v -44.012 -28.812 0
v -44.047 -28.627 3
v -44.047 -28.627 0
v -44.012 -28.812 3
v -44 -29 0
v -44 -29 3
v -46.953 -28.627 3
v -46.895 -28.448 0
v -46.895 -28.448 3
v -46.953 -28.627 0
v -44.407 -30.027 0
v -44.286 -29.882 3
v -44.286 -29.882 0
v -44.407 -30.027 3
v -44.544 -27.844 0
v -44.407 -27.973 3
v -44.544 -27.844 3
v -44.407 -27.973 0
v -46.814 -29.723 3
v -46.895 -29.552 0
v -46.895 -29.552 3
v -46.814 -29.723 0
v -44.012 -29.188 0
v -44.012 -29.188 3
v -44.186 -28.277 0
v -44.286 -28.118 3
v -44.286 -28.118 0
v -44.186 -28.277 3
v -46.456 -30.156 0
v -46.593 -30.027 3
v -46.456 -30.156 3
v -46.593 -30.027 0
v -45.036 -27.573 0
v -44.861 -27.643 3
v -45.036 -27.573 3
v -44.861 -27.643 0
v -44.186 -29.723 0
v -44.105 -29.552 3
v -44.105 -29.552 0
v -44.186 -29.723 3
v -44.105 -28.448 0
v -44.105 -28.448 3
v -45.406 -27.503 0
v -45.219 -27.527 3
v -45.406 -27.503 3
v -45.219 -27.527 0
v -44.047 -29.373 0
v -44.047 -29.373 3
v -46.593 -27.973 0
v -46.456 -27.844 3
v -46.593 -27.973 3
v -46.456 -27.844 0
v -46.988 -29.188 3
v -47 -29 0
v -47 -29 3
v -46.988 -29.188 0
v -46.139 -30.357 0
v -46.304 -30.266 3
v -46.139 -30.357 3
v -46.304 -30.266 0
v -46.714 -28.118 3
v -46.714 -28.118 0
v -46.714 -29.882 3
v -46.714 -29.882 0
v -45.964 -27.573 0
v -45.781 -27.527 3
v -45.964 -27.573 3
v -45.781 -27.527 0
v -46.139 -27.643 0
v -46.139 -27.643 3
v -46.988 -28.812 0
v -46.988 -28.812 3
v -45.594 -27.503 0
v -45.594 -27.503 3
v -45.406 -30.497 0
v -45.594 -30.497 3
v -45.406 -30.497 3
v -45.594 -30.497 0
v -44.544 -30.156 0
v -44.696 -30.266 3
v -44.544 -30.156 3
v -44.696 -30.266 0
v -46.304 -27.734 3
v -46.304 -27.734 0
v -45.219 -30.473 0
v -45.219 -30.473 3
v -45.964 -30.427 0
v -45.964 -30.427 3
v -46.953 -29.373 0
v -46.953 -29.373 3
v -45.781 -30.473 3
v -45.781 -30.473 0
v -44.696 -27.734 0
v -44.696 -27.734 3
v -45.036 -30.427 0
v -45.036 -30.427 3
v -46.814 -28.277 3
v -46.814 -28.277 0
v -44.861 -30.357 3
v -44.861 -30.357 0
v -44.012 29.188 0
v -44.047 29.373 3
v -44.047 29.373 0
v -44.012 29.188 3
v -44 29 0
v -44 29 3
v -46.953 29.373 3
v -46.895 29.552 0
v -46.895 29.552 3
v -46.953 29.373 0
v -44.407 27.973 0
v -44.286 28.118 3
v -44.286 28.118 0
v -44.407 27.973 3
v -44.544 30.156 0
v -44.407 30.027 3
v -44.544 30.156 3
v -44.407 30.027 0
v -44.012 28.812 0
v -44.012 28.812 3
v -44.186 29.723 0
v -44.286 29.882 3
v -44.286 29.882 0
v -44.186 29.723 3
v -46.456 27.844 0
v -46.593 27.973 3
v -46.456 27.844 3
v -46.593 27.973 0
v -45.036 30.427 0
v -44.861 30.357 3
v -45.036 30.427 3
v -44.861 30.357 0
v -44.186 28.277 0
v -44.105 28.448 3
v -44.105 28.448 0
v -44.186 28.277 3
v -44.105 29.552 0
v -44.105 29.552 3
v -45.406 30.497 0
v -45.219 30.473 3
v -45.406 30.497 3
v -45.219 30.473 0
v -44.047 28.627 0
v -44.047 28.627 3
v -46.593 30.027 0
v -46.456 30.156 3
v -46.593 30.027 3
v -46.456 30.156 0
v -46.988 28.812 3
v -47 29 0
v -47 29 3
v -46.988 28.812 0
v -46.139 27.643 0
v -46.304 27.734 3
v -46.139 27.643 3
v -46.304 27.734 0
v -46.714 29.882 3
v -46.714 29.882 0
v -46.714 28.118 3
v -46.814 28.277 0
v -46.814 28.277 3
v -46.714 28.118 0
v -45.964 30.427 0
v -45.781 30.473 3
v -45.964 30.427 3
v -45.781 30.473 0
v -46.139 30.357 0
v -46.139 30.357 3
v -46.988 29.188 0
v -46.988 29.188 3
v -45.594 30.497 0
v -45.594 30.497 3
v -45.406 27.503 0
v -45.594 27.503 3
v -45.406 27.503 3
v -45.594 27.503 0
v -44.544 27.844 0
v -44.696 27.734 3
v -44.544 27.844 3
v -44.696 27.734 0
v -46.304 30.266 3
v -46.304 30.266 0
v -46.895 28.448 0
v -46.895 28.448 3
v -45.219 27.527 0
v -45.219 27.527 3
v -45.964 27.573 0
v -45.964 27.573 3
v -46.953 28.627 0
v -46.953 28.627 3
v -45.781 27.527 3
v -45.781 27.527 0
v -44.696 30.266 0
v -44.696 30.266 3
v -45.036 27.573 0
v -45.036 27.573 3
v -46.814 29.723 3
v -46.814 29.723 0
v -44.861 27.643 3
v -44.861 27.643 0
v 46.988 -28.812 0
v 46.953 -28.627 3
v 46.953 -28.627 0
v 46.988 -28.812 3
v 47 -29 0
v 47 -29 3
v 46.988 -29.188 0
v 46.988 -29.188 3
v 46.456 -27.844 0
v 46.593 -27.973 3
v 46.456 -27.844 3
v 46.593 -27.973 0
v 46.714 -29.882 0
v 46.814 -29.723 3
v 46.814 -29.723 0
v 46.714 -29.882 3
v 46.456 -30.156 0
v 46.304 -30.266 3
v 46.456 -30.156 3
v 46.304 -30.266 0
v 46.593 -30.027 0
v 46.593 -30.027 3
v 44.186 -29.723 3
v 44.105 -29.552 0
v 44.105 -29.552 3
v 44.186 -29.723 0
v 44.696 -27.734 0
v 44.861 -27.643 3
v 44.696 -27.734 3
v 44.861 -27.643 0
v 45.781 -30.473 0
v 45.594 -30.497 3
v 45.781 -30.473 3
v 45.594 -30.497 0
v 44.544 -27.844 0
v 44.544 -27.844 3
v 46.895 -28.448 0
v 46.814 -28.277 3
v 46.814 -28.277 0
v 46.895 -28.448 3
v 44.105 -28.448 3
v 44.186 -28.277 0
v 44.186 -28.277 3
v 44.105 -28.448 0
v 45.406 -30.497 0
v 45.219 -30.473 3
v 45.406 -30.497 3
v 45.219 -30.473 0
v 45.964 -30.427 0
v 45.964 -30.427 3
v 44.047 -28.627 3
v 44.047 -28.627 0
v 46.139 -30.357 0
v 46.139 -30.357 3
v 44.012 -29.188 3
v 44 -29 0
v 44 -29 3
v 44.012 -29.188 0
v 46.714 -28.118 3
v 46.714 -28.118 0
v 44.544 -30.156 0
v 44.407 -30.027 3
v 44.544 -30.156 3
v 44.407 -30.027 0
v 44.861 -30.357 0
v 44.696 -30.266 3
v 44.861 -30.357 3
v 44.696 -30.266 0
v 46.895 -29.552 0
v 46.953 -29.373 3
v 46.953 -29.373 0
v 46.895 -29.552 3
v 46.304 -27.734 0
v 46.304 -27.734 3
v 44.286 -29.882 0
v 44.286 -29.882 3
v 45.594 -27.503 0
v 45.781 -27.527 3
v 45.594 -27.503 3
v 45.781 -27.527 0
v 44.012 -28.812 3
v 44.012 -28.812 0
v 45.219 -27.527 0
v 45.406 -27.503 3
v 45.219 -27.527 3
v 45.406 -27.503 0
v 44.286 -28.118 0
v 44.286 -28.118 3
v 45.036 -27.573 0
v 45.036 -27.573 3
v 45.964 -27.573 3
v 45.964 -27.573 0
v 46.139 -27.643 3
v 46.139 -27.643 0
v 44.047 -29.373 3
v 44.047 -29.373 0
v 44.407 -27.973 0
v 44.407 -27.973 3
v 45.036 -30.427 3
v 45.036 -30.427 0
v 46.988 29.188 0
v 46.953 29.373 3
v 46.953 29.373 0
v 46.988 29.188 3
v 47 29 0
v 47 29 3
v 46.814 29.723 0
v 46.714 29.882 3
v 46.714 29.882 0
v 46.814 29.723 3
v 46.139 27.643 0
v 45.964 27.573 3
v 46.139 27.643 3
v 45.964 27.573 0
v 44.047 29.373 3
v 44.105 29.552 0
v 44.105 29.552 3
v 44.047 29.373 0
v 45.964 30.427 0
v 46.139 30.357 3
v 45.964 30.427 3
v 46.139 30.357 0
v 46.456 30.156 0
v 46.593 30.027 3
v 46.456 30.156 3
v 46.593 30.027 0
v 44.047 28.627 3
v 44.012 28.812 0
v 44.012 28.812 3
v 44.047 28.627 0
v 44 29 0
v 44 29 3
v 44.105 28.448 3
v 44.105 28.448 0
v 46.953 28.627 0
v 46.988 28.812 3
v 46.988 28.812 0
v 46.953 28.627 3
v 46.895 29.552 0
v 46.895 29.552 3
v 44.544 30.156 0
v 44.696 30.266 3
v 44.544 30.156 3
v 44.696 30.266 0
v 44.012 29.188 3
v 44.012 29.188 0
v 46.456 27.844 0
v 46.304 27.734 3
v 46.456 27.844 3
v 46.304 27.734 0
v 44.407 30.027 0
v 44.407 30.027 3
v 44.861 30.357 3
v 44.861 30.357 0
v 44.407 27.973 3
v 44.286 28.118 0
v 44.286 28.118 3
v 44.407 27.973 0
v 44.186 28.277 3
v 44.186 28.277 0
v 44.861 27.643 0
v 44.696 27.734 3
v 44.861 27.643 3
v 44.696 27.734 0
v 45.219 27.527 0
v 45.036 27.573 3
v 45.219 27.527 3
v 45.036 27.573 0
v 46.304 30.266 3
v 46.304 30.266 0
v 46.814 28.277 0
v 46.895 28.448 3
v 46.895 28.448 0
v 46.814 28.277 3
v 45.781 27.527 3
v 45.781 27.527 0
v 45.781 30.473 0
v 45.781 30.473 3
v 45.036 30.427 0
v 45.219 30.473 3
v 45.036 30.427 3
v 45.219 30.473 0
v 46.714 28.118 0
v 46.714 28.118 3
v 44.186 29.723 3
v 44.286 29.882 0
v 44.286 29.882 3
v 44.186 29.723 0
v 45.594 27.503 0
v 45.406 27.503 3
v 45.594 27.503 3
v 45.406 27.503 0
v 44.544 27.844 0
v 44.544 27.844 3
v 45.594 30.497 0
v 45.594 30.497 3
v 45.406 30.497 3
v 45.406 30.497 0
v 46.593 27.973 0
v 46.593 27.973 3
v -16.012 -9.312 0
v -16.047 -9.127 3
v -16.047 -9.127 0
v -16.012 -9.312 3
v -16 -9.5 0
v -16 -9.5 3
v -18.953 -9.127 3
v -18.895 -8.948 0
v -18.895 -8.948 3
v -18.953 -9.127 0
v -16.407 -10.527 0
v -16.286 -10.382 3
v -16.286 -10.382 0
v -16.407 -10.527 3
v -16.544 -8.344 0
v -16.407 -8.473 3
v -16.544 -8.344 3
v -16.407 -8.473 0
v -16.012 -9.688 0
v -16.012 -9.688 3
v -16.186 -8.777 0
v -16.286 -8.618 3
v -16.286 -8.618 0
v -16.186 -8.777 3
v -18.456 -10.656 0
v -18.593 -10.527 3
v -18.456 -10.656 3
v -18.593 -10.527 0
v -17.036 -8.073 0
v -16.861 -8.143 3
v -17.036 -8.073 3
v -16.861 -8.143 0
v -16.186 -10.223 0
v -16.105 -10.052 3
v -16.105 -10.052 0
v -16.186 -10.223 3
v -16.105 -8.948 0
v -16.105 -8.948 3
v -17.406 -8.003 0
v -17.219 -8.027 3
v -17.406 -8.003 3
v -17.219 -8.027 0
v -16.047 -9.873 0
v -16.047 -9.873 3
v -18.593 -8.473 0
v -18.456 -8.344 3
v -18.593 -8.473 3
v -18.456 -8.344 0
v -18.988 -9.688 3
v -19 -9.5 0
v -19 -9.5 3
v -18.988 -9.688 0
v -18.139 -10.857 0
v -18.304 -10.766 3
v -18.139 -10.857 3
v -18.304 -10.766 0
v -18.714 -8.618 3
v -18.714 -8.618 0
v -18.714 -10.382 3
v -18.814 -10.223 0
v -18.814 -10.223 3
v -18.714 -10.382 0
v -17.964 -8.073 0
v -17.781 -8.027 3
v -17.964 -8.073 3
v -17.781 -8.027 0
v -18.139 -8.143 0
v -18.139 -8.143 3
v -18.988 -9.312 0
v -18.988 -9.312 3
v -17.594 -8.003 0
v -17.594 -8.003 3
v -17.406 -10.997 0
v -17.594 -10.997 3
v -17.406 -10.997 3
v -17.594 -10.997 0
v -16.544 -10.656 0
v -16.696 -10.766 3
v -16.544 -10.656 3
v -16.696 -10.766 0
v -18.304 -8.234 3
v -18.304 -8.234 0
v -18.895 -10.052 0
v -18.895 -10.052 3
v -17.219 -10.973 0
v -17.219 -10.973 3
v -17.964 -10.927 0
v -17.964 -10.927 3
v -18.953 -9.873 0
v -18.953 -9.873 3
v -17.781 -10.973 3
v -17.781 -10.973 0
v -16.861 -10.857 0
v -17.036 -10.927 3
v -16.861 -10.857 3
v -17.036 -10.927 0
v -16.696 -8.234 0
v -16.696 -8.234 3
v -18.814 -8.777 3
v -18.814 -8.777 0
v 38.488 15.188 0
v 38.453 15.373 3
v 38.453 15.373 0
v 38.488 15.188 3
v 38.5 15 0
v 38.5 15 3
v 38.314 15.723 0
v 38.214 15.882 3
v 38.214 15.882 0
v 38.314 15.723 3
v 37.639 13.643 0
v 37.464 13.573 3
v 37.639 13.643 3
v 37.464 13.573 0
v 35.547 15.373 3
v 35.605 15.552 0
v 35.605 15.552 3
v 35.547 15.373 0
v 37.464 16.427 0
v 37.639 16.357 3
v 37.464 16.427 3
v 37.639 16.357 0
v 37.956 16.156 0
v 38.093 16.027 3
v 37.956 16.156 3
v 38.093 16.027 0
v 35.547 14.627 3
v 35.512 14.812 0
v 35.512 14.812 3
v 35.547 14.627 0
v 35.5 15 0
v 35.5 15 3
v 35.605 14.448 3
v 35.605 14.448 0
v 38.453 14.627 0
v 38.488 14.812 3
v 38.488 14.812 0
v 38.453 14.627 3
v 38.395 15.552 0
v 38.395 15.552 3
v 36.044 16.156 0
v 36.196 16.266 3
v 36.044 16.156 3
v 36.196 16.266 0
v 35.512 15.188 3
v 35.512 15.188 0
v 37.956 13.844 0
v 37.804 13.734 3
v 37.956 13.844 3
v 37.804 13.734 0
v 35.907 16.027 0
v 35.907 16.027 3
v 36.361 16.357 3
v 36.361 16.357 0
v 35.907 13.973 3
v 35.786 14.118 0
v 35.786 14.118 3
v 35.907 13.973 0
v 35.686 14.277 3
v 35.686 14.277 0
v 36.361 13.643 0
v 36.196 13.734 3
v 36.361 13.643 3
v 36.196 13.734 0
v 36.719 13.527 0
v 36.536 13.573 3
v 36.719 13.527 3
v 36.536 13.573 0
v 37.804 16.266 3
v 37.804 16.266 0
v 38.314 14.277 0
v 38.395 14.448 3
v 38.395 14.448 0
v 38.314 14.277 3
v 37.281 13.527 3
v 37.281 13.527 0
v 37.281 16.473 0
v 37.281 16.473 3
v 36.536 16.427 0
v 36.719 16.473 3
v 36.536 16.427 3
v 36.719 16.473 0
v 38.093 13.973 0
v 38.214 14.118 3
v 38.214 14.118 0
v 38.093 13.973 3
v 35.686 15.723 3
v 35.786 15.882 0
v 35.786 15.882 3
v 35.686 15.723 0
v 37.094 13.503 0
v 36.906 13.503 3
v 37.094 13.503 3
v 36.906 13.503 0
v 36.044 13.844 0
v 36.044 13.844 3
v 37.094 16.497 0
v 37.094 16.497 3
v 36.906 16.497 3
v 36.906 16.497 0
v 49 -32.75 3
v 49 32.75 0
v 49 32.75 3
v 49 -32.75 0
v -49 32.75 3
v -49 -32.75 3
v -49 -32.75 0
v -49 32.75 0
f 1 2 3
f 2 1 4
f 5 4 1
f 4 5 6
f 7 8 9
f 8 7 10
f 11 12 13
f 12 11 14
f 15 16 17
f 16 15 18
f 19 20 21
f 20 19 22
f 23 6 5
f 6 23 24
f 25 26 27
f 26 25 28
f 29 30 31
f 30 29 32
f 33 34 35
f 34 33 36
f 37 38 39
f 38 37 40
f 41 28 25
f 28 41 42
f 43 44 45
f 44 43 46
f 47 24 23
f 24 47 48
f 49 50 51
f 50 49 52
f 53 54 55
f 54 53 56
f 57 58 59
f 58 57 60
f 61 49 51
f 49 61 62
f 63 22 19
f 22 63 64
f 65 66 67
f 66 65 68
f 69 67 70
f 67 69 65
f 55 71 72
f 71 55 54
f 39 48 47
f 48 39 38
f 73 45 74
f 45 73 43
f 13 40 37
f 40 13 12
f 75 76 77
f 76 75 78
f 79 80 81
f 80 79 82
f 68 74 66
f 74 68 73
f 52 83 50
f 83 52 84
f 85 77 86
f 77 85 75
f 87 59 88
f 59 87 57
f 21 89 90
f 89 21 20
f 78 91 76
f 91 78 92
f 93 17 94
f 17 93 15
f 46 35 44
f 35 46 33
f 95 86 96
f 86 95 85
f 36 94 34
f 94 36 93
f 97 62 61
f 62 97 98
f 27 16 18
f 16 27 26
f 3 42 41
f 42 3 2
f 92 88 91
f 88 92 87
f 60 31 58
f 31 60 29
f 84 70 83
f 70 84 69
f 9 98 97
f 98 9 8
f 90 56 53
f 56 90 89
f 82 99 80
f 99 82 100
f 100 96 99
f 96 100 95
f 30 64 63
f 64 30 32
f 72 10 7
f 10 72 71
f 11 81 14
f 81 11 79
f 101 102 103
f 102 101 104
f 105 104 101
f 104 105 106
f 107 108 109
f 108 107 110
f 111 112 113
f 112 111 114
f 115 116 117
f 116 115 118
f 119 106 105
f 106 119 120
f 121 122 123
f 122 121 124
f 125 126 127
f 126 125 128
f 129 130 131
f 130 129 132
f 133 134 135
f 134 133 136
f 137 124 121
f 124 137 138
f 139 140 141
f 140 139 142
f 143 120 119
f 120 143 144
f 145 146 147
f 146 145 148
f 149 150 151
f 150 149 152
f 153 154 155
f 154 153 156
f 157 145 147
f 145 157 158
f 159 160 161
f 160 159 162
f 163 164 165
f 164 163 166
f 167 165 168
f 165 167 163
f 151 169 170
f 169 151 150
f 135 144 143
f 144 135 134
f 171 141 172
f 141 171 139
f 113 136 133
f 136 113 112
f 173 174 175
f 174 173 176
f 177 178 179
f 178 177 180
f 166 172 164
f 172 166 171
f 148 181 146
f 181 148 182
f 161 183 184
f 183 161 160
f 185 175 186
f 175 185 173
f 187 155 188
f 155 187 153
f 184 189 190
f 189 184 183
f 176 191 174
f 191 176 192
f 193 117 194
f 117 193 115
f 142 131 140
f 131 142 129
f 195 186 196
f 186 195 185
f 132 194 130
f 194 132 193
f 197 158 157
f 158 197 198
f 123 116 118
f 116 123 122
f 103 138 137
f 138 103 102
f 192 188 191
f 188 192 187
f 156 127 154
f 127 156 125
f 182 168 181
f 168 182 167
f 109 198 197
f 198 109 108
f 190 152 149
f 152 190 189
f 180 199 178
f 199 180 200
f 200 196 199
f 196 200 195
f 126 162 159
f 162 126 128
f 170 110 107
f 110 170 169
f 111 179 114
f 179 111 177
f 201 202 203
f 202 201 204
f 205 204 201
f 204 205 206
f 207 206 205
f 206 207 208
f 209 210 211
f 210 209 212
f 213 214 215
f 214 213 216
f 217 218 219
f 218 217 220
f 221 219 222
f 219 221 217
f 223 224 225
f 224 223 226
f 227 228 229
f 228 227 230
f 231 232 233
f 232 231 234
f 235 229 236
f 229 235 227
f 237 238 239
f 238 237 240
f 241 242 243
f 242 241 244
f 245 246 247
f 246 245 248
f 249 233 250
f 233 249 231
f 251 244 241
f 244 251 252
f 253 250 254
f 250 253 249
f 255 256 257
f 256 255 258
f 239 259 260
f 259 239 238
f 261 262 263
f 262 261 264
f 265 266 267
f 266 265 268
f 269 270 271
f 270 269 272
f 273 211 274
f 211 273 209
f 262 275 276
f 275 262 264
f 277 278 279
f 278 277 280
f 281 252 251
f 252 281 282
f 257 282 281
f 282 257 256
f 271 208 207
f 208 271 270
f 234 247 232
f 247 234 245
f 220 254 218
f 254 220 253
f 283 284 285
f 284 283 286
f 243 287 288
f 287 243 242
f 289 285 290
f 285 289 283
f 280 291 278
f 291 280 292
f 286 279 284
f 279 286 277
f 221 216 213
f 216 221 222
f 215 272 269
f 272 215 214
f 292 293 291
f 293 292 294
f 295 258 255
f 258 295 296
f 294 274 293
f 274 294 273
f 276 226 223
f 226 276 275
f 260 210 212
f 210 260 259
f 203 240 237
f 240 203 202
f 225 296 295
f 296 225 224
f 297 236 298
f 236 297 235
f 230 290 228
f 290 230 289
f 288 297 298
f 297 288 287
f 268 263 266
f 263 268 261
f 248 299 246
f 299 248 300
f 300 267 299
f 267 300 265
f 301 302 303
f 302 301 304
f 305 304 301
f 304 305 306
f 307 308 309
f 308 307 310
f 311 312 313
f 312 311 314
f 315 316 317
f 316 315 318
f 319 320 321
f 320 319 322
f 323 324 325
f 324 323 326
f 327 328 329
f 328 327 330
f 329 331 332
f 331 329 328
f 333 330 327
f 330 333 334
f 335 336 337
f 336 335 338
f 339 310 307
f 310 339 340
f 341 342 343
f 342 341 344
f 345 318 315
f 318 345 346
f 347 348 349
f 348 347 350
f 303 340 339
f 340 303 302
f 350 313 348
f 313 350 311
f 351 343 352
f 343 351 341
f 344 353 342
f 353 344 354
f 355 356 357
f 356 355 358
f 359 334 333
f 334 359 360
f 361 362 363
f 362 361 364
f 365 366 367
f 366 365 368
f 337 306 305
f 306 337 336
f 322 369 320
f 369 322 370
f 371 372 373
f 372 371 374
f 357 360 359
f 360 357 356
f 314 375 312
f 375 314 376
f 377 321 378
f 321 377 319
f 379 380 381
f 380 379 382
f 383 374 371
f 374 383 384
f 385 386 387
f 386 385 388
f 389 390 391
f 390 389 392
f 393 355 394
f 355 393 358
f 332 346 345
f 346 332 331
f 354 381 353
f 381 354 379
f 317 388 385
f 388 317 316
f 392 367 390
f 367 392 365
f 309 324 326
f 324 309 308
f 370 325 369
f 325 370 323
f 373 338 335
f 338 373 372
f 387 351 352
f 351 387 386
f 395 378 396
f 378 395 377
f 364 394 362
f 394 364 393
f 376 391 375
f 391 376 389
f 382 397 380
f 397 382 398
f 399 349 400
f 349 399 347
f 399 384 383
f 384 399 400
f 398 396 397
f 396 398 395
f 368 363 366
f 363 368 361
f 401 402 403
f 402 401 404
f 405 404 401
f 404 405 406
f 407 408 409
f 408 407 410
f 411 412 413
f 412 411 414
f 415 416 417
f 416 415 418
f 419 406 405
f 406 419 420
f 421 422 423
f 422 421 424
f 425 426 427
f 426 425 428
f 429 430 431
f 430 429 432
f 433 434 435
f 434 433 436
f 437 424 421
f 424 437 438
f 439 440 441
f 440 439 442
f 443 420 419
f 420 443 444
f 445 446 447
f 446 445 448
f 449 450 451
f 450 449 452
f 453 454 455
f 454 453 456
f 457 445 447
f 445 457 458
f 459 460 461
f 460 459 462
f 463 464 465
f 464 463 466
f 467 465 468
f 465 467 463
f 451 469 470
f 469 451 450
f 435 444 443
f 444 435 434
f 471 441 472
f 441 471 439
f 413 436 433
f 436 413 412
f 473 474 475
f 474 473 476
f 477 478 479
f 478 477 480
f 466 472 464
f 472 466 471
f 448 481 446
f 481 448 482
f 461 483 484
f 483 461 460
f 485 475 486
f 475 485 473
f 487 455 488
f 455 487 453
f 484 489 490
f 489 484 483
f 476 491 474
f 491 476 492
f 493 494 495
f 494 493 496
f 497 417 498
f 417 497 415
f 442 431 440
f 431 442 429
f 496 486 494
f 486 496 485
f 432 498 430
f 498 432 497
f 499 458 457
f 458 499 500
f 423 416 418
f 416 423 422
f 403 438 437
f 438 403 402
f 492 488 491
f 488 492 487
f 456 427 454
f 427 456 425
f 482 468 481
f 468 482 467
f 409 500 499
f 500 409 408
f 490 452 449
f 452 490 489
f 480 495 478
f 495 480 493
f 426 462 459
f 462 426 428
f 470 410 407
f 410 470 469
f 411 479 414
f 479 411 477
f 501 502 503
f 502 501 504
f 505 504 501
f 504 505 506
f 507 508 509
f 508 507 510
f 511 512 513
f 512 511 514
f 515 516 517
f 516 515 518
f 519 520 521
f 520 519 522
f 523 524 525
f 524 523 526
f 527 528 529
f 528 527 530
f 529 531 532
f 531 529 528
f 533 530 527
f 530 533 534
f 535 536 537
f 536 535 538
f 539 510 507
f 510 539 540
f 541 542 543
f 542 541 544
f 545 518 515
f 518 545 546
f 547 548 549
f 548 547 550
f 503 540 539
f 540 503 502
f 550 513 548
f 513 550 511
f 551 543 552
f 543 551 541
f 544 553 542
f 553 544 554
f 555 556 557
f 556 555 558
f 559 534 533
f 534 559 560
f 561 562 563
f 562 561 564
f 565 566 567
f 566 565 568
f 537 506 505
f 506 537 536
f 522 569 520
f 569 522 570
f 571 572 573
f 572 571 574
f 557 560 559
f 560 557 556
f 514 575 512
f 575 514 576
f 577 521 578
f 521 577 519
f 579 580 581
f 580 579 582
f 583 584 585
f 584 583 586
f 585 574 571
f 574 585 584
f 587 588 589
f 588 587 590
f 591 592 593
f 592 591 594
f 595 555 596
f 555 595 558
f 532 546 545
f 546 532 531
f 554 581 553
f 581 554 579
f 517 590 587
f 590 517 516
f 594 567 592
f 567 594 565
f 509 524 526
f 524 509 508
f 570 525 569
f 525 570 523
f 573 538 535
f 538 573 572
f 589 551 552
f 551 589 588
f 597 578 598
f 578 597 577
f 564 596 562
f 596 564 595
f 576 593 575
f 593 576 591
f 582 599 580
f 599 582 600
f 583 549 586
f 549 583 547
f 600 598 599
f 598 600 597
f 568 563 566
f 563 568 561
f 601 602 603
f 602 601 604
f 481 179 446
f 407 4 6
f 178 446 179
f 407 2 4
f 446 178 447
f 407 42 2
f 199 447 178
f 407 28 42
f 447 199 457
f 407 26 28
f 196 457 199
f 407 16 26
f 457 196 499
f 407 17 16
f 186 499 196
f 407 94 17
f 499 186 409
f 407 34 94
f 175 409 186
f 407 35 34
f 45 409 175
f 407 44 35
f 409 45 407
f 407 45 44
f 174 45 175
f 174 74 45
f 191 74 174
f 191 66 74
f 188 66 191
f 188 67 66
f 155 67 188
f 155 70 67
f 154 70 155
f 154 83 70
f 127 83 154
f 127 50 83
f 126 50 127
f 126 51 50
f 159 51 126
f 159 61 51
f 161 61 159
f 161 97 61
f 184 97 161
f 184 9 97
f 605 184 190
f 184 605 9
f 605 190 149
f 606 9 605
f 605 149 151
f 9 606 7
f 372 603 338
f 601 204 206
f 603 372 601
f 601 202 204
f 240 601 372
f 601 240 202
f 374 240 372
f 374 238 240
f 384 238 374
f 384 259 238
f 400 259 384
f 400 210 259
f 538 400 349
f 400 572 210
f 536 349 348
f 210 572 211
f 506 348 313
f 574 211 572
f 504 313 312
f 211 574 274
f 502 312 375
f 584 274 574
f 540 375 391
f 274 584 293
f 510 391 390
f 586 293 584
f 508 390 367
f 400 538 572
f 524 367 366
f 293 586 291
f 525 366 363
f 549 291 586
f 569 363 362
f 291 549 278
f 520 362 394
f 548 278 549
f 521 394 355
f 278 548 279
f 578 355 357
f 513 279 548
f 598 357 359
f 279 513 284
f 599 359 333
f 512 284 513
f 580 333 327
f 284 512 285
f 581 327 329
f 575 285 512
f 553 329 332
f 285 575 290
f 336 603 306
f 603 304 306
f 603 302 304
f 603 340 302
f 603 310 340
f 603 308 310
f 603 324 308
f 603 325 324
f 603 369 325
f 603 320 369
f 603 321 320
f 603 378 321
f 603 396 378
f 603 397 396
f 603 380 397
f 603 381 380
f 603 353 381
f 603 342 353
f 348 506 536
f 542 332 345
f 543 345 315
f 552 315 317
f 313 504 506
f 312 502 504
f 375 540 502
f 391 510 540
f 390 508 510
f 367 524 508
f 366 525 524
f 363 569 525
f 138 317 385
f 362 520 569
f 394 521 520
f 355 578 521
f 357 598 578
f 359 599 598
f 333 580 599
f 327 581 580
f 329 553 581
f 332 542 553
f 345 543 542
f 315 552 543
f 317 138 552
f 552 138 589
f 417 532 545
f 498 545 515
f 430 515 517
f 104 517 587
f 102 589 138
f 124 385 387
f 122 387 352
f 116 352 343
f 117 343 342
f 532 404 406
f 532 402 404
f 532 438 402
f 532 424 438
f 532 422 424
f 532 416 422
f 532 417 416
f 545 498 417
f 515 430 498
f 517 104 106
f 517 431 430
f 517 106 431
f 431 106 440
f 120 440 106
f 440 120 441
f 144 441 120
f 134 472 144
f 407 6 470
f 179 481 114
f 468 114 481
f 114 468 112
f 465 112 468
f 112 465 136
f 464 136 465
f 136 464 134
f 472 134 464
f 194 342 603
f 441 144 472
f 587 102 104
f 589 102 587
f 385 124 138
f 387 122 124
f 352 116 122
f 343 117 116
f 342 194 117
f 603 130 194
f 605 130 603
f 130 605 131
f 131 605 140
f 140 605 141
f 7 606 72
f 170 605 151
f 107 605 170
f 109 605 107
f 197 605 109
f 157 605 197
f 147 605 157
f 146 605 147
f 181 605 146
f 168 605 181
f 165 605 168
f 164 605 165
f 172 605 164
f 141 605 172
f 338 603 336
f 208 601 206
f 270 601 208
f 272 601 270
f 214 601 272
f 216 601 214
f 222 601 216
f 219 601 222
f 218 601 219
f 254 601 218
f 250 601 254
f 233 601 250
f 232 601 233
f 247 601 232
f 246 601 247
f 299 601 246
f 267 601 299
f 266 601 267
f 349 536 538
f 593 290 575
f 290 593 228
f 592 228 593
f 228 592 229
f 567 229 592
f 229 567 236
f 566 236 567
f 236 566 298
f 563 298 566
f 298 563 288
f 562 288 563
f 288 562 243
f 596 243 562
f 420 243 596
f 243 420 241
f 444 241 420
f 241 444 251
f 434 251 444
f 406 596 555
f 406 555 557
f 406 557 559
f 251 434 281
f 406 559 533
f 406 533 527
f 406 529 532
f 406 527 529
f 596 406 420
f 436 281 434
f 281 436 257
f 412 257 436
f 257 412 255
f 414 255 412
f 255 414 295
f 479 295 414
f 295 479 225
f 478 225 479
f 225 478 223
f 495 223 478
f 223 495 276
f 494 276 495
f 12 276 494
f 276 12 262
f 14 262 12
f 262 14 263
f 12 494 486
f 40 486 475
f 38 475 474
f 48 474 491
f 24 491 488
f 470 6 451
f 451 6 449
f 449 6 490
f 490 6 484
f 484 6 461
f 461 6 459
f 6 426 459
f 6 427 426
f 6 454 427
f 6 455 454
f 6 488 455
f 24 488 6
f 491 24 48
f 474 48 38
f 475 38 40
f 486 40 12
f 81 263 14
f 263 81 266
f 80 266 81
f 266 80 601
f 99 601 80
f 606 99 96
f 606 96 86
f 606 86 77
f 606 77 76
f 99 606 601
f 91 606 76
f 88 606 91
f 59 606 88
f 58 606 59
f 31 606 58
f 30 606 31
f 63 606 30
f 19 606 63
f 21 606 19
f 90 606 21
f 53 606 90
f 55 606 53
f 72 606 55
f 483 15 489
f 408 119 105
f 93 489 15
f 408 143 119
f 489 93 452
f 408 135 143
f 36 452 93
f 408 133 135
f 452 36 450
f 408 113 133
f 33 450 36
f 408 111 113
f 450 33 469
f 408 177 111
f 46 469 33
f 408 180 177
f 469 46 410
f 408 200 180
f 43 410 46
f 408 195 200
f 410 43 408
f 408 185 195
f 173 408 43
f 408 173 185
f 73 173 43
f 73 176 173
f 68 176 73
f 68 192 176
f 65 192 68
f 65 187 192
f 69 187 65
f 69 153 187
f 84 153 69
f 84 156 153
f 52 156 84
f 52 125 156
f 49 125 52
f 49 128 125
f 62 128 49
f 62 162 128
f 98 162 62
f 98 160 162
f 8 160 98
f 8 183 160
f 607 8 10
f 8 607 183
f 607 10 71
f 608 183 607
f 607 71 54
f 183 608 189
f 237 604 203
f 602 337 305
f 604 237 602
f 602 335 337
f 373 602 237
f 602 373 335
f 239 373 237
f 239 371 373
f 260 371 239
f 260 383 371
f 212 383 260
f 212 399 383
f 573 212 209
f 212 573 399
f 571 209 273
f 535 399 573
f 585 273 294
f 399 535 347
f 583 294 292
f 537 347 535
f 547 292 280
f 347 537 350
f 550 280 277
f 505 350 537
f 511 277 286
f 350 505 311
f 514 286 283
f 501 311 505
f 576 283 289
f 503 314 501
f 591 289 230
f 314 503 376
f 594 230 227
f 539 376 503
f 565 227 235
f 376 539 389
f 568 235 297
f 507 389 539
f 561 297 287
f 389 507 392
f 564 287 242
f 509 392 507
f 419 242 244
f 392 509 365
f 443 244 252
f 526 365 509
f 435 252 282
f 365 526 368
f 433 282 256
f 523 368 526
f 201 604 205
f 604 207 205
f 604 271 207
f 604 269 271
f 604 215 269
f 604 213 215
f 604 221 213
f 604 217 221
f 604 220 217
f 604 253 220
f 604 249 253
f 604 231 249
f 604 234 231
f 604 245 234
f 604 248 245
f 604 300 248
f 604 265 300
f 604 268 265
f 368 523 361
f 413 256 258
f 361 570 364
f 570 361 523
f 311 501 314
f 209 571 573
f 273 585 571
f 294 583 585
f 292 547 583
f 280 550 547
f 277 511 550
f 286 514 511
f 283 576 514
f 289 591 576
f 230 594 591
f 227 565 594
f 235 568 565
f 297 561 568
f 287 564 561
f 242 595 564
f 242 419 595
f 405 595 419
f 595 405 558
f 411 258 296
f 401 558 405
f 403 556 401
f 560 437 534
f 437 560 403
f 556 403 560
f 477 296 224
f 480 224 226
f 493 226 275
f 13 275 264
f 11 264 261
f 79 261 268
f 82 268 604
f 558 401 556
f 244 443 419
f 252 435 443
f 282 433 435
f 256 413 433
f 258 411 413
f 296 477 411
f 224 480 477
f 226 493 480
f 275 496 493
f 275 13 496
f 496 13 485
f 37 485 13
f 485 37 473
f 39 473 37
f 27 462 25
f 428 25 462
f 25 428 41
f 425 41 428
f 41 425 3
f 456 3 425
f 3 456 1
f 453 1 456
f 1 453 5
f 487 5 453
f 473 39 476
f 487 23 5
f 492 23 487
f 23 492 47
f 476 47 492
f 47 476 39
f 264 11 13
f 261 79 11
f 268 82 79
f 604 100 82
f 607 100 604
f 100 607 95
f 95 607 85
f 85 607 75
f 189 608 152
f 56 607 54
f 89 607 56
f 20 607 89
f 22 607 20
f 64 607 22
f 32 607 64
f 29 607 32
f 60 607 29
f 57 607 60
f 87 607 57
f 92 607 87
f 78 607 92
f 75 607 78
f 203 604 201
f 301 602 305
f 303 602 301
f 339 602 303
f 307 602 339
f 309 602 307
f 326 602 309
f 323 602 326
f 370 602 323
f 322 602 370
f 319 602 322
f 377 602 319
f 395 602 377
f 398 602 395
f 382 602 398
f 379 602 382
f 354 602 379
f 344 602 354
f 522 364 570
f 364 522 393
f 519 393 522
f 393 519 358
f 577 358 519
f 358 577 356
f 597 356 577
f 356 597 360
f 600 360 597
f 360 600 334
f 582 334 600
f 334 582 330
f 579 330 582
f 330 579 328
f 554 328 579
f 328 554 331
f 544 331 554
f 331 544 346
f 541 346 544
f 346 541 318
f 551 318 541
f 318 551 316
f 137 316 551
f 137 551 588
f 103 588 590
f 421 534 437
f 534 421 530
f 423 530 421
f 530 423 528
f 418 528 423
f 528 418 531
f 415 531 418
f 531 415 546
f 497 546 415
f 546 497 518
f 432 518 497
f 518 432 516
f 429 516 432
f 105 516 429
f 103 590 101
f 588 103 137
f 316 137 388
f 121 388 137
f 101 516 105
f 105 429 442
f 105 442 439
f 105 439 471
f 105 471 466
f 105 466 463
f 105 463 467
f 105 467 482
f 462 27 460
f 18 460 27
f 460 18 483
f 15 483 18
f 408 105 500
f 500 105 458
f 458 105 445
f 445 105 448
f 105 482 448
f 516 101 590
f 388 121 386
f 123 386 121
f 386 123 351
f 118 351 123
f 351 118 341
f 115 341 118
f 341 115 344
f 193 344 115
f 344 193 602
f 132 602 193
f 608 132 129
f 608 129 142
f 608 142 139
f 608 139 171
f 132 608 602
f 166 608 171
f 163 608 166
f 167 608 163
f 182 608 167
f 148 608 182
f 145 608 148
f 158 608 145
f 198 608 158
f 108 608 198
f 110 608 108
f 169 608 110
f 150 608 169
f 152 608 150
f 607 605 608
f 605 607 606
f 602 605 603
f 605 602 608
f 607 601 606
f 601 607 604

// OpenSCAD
// Raspicam for Pibow (model B)
// A raspicam support for the Pibow case (Pimoroni).

// Copyright (c) 2014 Jérémie DECOCK <jd.jdhp@gmail.com>

// PIBOW BASE ///////////////////////////////

// Pibow for RPi model B: 
//     Dimensions (mm): 98 x 65.5 x 18
//
// RPi and pibow screws:
//     Diameter: 3 mm
module pibow_b_base(screw_height) {

    // Local const
    screw_radius = 1.5;
    screw_spacing_x = 91;
    screw_spacing_y = 58;

    // Four screw holes
    for (i = [-1, 1]) {    
        for (j = [-1, 1]) {    
            translate([i*screw_spacing_x/2, j*screw_spacing_y/2, 0]) {        
                cylinder(r=screw_radius, h=screw_height+1, center=true, $fn=50);
            }
        }
    }

    // RPi screw holes
    translate([-17.5, -9.5, 0]) cylinder(r=screw_radius, h=screw_height+1, center=true, $fn=50);
    translate([37, 15, 0])    cylinder(r=screw_radius, h=screw_height+1, center=true, $fn=50);

}

// TEST /////////////////////////////////////

board_width=98;      // x
board_depth=65.5;    // y
board_height=3;      // z

// Check vars
if(board_width < 98)   echo("WARNING: board_width should be greater than or equal to 98");
if(board_depth < 65.5) echo("WARNING: board_depth should be greater than or equal to 65.5");

translate([0, 0, board_height/2]) {
    difference() {
        cube([board_width, board_depth, board_height], center=true);
        #pibow_b_base(board_height);
    }
}
